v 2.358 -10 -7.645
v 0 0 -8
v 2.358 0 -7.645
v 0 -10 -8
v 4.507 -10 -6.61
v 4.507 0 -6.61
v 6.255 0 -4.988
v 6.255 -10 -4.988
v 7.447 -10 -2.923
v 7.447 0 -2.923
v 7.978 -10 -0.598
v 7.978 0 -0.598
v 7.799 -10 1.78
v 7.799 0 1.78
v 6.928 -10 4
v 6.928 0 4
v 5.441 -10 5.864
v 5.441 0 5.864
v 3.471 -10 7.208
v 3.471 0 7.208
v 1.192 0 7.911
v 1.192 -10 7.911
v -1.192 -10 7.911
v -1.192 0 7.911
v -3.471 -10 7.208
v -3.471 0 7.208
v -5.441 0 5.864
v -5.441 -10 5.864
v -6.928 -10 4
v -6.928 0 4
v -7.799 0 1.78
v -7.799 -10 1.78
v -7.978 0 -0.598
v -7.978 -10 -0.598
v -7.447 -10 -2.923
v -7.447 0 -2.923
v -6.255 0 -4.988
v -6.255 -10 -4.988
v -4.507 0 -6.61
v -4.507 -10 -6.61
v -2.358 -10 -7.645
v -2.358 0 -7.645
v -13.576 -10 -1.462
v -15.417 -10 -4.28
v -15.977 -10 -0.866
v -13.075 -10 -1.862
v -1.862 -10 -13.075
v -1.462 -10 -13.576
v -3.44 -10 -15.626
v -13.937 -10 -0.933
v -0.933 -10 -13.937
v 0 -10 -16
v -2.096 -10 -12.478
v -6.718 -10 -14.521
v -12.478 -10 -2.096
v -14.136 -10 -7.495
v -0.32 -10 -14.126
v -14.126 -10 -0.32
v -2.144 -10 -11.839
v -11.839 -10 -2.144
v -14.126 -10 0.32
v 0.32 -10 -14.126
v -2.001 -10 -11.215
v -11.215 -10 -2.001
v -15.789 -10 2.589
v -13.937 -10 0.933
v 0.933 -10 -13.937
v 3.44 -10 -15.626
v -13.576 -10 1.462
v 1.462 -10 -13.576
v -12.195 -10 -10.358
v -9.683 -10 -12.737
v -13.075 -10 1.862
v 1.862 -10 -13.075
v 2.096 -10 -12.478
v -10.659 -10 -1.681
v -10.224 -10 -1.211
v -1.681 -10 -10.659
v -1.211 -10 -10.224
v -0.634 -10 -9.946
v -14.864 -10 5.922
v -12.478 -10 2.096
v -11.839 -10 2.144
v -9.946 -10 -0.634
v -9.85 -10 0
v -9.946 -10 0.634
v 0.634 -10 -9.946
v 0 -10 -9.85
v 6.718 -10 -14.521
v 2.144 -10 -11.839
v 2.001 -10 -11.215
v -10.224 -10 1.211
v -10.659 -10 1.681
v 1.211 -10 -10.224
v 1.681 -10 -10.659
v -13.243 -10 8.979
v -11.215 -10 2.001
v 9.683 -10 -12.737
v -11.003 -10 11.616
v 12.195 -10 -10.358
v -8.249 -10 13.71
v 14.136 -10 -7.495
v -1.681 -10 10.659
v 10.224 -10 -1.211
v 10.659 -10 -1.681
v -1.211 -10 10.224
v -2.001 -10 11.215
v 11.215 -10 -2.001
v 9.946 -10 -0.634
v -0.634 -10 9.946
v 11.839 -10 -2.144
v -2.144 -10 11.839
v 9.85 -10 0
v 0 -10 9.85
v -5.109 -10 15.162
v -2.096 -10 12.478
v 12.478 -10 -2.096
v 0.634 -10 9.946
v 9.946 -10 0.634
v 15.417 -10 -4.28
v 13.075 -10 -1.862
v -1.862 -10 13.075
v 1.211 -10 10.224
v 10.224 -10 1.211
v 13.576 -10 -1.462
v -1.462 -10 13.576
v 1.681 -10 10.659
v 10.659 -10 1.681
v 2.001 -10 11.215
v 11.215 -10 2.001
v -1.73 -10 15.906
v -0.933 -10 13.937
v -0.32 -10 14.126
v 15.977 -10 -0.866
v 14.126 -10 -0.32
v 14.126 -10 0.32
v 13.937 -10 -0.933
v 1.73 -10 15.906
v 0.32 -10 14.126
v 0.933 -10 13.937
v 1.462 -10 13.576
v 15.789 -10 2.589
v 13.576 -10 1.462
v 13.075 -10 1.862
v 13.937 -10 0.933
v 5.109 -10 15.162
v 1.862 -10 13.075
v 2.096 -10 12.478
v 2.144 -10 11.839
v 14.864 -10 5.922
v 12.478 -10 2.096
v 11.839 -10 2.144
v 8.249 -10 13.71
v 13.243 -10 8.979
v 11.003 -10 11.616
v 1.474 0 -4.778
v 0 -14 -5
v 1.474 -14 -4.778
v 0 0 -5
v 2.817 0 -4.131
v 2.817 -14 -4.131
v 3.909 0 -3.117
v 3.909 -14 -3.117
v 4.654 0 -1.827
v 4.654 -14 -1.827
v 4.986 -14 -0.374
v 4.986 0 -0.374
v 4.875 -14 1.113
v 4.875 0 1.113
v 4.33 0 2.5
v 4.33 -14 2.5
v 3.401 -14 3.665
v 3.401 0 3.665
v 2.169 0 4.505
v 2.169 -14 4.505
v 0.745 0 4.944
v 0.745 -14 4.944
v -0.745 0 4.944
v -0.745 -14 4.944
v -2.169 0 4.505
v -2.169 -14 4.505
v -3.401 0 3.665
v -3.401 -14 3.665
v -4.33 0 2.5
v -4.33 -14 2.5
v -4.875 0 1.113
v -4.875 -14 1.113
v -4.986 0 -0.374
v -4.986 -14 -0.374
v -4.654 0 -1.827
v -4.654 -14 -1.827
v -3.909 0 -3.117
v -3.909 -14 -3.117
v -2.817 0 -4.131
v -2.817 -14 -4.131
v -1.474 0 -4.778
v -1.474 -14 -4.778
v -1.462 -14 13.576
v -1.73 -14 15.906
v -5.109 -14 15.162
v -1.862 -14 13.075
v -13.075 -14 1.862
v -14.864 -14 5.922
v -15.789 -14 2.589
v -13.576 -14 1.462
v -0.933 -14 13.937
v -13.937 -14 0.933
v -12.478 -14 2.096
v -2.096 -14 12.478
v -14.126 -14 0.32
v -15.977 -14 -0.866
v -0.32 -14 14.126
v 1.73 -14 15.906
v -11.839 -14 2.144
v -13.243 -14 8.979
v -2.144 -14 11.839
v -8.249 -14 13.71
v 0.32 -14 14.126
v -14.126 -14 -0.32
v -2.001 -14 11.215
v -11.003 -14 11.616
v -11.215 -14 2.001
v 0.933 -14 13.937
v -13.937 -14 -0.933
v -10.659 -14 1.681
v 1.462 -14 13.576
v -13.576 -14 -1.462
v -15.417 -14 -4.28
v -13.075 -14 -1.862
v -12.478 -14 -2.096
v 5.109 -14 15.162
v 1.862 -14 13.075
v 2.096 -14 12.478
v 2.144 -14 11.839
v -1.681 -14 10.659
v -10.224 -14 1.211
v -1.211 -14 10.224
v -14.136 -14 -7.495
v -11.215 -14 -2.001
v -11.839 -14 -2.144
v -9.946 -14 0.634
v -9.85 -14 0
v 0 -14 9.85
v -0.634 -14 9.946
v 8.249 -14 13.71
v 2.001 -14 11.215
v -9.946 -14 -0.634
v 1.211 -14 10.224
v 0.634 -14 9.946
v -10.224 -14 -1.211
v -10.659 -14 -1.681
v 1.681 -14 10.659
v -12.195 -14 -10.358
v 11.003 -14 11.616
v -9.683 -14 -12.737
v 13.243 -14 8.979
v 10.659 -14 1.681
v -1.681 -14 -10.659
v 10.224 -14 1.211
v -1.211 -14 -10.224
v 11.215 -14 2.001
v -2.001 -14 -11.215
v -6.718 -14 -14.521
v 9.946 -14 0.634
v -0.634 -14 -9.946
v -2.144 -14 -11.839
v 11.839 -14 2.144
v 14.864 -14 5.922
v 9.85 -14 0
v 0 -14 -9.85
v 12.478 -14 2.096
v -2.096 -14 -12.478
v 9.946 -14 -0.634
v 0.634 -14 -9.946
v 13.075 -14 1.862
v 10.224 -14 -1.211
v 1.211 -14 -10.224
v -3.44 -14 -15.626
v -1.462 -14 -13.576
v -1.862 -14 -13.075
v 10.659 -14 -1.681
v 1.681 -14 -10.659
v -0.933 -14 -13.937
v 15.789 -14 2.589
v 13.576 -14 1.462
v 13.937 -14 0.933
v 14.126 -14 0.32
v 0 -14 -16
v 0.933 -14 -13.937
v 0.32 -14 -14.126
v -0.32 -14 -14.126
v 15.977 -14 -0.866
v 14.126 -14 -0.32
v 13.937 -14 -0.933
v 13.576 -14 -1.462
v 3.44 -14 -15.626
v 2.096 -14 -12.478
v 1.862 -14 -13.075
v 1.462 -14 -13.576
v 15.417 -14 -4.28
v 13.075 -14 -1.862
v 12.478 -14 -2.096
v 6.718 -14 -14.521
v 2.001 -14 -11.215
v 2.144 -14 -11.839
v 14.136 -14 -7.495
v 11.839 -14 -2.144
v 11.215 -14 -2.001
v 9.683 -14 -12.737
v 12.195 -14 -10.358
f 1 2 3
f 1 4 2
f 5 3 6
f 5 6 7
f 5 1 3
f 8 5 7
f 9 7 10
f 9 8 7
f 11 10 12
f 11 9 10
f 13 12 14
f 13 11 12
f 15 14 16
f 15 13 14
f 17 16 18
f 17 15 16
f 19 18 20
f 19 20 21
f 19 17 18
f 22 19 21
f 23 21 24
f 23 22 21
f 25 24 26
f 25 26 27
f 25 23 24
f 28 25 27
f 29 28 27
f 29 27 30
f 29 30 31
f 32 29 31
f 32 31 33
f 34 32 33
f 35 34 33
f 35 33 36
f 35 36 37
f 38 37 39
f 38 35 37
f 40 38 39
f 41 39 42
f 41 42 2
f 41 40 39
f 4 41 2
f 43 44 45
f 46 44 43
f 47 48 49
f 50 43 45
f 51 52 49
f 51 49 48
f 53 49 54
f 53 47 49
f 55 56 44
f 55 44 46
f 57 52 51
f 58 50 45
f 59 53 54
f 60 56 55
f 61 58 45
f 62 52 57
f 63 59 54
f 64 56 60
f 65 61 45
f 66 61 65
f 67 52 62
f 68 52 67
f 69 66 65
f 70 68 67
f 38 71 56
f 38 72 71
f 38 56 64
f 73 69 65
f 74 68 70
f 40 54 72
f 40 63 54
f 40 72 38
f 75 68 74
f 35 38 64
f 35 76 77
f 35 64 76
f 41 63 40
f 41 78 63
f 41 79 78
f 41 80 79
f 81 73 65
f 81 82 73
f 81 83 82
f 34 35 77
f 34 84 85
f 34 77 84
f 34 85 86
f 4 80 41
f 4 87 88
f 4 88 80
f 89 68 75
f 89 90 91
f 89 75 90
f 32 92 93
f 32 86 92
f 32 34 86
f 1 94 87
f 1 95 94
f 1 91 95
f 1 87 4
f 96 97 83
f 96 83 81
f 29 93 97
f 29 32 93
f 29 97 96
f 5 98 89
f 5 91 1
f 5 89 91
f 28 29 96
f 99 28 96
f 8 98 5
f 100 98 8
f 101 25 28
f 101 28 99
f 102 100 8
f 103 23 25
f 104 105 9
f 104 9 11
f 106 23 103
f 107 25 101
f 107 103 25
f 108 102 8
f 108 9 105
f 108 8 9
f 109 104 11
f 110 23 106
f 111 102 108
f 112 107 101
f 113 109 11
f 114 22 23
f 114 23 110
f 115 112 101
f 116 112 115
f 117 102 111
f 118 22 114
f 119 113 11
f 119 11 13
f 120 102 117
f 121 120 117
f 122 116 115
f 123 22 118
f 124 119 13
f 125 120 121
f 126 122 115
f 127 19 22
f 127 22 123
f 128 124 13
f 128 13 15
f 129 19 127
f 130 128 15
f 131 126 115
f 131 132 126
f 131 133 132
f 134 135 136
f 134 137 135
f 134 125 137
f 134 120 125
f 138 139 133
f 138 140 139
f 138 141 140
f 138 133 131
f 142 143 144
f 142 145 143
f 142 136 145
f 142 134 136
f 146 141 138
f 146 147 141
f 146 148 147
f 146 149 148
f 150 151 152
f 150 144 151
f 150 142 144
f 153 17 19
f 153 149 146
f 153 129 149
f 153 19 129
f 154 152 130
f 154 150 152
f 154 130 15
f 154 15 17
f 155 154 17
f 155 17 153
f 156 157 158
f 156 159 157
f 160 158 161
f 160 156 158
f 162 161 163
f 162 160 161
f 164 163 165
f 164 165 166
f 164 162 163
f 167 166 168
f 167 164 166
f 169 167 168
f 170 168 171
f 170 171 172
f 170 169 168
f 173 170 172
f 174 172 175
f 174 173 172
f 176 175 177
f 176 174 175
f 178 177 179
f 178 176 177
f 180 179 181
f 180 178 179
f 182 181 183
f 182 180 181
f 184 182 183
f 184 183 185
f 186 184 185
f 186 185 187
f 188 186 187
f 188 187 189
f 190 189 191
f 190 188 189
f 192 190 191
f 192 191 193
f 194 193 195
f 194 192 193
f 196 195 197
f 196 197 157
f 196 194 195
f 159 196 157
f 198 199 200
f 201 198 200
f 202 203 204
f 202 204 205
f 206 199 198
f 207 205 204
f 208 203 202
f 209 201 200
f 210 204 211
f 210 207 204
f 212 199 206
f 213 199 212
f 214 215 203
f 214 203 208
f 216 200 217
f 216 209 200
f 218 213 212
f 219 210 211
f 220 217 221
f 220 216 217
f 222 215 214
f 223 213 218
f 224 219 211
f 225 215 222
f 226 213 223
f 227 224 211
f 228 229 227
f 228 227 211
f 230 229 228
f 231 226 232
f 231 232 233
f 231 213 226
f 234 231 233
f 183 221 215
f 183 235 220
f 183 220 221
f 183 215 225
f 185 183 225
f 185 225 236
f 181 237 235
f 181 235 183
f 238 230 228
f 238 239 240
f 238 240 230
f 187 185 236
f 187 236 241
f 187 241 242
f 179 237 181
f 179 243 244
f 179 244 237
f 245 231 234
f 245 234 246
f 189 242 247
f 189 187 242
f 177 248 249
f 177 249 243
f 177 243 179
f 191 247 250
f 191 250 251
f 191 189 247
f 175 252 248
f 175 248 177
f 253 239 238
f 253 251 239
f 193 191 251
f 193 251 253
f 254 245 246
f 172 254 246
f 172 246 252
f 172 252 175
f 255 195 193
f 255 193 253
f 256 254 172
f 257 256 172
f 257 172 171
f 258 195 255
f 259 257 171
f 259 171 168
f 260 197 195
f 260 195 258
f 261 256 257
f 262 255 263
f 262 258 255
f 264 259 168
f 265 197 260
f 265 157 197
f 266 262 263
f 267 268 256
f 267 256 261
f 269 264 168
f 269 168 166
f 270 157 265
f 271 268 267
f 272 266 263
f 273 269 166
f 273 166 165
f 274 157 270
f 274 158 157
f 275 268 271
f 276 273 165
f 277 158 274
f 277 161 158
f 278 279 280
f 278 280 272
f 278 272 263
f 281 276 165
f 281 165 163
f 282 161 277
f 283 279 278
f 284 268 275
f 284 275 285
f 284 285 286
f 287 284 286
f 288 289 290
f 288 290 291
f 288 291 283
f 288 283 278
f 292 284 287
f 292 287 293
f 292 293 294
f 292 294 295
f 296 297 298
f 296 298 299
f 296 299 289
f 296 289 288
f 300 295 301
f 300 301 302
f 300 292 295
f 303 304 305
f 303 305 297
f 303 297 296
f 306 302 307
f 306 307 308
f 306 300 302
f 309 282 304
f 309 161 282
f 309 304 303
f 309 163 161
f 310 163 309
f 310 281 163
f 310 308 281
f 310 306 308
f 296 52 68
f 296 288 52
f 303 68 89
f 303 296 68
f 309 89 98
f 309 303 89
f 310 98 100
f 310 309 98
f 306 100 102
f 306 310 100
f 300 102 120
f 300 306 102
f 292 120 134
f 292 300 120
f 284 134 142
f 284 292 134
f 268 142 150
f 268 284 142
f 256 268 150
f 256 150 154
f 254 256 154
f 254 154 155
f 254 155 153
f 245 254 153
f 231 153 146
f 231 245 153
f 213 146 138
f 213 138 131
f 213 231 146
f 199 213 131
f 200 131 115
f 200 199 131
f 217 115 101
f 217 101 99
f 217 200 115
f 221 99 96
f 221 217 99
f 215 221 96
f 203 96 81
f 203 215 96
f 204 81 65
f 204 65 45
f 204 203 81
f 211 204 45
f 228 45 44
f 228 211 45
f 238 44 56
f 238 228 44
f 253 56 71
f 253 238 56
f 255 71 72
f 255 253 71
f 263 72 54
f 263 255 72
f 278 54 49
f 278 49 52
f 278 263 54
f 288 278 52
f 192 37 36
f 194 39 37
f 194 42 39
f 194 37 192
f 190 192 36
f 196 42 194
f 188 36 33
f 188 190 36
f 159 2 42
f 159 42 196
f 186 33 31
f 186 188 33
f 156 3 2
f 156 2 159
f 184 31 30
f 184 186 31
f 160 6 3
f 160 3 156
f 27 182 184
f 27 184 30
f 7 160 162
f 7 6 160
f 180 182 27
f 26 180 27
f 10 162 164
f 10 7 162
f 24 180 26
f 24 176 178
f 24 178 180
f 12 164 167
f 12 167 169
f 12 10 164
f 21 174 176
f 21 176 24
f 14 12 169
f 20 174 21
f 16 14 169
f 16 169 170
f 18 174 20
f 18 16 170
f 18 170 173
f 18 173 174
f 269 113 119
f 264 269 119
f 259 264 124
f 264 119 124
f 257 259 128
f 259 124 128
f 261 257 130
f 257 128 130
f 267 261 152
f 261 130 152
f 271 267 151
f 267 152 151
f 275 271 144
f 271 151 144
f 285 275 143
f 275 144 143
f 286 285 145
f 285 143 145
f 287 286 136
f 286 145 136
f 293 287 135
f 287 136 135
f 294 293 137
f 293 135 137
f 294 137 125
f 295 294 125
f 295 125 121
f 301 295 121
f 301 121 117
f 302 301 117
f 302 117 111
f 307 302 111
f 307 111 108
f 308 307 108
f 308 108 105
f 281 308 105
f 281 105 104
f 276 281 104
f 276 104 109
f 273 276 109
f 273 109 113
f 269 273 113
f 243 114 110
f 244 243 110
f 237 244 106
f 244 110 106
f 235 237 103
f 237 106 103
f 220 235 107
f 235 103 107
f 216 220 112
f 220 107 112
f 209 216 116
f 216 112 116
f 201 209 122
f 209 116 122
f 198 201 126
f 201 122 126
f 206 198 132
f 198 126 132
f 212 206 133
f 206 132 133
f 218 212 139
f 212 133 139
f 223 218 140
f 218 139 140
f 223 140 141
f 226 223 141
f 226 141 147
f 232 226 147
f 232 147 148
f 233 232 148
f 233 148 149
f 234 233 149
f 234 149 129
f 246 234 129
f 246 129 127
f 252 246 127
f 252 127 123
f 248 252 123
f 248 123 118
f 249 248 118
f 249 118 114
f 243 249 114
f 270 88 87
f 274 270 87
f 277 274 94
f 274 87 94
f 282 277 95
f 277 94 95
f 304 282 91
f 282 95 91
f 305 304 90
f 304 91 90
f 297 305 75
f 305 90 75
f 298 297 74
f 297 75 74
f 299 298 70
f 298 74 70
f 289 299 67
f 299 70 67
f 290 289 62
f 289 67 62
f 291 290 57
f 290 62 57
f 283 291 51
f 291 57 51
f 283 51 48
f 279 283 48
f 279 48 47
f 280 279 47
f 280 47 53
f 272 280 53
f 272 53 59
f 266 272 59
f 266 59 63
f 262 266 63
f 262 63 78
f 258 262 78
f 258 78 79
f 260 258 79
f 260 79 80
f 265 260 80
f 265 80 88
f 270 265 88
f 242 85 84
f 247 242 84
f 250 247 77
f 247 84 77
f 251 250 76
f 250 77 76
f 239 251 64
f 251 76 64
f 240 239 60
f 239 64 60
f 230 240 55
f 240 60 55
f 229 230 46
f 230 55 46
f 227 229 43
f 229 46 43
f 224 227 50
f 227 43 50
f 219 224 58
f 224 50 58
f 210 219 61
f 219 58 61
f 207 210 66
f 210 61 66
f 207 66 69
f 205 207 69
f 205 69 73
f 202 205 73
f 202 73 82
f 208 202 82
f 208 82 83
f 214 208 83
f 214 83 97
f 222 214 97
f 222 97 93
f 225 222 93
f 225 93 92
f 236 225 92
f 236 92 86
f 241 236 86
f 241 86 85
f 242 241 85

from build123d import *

# Parameters (mm, degrees)
SKETCH2_R          = 2.15
CUT_EXTRUDE1_DEPTH = 5
CIRPATTERN1_COUNT  = 4


with BuildPart() as part:
    # Sketch1 → Revolve4 (revolve)
    with BuildSketch(Plane(origin=(0, 0, 0), x_dir=(0, 0, -1), z_dir=(1, 0, 0))):
        Polygon((8, 0), (8, -10), (16, -10), (16, -14), (5, -14), (5, 0), align=None)
    revolve(axis=Axis((0, 0, 0), (0, -1, 0)))

    # Sketch2 → Cut-Extrude1 (cut, through all)
    with BuildSketch(Plane(origin=(0, -10, 0), x_dir=(1, 0, 0), z_dir=(0, 1, 0))):
        with Locations((-12, 0)):
            Circle(SKETCH2_R)
    cut_extrude1 = extrude(amount=-CUT_EXTRUDE1_DEPTH, mode=Mode.SUBTRACT)

    # CirPattern1: Cut-Extrude1 ×4 about axis
    cirpattern1_axis = Axis((0, 0, 0), (0, 1, 0))
    for i in range(1, CIRPATTERN1_COUNT):
        add(cut_extrude1.rotate(cirpattern1_axis, i * 360 / CIRPATTERN1_COUNT), mode=Mode.SUBTRACT)


solid = part.part
